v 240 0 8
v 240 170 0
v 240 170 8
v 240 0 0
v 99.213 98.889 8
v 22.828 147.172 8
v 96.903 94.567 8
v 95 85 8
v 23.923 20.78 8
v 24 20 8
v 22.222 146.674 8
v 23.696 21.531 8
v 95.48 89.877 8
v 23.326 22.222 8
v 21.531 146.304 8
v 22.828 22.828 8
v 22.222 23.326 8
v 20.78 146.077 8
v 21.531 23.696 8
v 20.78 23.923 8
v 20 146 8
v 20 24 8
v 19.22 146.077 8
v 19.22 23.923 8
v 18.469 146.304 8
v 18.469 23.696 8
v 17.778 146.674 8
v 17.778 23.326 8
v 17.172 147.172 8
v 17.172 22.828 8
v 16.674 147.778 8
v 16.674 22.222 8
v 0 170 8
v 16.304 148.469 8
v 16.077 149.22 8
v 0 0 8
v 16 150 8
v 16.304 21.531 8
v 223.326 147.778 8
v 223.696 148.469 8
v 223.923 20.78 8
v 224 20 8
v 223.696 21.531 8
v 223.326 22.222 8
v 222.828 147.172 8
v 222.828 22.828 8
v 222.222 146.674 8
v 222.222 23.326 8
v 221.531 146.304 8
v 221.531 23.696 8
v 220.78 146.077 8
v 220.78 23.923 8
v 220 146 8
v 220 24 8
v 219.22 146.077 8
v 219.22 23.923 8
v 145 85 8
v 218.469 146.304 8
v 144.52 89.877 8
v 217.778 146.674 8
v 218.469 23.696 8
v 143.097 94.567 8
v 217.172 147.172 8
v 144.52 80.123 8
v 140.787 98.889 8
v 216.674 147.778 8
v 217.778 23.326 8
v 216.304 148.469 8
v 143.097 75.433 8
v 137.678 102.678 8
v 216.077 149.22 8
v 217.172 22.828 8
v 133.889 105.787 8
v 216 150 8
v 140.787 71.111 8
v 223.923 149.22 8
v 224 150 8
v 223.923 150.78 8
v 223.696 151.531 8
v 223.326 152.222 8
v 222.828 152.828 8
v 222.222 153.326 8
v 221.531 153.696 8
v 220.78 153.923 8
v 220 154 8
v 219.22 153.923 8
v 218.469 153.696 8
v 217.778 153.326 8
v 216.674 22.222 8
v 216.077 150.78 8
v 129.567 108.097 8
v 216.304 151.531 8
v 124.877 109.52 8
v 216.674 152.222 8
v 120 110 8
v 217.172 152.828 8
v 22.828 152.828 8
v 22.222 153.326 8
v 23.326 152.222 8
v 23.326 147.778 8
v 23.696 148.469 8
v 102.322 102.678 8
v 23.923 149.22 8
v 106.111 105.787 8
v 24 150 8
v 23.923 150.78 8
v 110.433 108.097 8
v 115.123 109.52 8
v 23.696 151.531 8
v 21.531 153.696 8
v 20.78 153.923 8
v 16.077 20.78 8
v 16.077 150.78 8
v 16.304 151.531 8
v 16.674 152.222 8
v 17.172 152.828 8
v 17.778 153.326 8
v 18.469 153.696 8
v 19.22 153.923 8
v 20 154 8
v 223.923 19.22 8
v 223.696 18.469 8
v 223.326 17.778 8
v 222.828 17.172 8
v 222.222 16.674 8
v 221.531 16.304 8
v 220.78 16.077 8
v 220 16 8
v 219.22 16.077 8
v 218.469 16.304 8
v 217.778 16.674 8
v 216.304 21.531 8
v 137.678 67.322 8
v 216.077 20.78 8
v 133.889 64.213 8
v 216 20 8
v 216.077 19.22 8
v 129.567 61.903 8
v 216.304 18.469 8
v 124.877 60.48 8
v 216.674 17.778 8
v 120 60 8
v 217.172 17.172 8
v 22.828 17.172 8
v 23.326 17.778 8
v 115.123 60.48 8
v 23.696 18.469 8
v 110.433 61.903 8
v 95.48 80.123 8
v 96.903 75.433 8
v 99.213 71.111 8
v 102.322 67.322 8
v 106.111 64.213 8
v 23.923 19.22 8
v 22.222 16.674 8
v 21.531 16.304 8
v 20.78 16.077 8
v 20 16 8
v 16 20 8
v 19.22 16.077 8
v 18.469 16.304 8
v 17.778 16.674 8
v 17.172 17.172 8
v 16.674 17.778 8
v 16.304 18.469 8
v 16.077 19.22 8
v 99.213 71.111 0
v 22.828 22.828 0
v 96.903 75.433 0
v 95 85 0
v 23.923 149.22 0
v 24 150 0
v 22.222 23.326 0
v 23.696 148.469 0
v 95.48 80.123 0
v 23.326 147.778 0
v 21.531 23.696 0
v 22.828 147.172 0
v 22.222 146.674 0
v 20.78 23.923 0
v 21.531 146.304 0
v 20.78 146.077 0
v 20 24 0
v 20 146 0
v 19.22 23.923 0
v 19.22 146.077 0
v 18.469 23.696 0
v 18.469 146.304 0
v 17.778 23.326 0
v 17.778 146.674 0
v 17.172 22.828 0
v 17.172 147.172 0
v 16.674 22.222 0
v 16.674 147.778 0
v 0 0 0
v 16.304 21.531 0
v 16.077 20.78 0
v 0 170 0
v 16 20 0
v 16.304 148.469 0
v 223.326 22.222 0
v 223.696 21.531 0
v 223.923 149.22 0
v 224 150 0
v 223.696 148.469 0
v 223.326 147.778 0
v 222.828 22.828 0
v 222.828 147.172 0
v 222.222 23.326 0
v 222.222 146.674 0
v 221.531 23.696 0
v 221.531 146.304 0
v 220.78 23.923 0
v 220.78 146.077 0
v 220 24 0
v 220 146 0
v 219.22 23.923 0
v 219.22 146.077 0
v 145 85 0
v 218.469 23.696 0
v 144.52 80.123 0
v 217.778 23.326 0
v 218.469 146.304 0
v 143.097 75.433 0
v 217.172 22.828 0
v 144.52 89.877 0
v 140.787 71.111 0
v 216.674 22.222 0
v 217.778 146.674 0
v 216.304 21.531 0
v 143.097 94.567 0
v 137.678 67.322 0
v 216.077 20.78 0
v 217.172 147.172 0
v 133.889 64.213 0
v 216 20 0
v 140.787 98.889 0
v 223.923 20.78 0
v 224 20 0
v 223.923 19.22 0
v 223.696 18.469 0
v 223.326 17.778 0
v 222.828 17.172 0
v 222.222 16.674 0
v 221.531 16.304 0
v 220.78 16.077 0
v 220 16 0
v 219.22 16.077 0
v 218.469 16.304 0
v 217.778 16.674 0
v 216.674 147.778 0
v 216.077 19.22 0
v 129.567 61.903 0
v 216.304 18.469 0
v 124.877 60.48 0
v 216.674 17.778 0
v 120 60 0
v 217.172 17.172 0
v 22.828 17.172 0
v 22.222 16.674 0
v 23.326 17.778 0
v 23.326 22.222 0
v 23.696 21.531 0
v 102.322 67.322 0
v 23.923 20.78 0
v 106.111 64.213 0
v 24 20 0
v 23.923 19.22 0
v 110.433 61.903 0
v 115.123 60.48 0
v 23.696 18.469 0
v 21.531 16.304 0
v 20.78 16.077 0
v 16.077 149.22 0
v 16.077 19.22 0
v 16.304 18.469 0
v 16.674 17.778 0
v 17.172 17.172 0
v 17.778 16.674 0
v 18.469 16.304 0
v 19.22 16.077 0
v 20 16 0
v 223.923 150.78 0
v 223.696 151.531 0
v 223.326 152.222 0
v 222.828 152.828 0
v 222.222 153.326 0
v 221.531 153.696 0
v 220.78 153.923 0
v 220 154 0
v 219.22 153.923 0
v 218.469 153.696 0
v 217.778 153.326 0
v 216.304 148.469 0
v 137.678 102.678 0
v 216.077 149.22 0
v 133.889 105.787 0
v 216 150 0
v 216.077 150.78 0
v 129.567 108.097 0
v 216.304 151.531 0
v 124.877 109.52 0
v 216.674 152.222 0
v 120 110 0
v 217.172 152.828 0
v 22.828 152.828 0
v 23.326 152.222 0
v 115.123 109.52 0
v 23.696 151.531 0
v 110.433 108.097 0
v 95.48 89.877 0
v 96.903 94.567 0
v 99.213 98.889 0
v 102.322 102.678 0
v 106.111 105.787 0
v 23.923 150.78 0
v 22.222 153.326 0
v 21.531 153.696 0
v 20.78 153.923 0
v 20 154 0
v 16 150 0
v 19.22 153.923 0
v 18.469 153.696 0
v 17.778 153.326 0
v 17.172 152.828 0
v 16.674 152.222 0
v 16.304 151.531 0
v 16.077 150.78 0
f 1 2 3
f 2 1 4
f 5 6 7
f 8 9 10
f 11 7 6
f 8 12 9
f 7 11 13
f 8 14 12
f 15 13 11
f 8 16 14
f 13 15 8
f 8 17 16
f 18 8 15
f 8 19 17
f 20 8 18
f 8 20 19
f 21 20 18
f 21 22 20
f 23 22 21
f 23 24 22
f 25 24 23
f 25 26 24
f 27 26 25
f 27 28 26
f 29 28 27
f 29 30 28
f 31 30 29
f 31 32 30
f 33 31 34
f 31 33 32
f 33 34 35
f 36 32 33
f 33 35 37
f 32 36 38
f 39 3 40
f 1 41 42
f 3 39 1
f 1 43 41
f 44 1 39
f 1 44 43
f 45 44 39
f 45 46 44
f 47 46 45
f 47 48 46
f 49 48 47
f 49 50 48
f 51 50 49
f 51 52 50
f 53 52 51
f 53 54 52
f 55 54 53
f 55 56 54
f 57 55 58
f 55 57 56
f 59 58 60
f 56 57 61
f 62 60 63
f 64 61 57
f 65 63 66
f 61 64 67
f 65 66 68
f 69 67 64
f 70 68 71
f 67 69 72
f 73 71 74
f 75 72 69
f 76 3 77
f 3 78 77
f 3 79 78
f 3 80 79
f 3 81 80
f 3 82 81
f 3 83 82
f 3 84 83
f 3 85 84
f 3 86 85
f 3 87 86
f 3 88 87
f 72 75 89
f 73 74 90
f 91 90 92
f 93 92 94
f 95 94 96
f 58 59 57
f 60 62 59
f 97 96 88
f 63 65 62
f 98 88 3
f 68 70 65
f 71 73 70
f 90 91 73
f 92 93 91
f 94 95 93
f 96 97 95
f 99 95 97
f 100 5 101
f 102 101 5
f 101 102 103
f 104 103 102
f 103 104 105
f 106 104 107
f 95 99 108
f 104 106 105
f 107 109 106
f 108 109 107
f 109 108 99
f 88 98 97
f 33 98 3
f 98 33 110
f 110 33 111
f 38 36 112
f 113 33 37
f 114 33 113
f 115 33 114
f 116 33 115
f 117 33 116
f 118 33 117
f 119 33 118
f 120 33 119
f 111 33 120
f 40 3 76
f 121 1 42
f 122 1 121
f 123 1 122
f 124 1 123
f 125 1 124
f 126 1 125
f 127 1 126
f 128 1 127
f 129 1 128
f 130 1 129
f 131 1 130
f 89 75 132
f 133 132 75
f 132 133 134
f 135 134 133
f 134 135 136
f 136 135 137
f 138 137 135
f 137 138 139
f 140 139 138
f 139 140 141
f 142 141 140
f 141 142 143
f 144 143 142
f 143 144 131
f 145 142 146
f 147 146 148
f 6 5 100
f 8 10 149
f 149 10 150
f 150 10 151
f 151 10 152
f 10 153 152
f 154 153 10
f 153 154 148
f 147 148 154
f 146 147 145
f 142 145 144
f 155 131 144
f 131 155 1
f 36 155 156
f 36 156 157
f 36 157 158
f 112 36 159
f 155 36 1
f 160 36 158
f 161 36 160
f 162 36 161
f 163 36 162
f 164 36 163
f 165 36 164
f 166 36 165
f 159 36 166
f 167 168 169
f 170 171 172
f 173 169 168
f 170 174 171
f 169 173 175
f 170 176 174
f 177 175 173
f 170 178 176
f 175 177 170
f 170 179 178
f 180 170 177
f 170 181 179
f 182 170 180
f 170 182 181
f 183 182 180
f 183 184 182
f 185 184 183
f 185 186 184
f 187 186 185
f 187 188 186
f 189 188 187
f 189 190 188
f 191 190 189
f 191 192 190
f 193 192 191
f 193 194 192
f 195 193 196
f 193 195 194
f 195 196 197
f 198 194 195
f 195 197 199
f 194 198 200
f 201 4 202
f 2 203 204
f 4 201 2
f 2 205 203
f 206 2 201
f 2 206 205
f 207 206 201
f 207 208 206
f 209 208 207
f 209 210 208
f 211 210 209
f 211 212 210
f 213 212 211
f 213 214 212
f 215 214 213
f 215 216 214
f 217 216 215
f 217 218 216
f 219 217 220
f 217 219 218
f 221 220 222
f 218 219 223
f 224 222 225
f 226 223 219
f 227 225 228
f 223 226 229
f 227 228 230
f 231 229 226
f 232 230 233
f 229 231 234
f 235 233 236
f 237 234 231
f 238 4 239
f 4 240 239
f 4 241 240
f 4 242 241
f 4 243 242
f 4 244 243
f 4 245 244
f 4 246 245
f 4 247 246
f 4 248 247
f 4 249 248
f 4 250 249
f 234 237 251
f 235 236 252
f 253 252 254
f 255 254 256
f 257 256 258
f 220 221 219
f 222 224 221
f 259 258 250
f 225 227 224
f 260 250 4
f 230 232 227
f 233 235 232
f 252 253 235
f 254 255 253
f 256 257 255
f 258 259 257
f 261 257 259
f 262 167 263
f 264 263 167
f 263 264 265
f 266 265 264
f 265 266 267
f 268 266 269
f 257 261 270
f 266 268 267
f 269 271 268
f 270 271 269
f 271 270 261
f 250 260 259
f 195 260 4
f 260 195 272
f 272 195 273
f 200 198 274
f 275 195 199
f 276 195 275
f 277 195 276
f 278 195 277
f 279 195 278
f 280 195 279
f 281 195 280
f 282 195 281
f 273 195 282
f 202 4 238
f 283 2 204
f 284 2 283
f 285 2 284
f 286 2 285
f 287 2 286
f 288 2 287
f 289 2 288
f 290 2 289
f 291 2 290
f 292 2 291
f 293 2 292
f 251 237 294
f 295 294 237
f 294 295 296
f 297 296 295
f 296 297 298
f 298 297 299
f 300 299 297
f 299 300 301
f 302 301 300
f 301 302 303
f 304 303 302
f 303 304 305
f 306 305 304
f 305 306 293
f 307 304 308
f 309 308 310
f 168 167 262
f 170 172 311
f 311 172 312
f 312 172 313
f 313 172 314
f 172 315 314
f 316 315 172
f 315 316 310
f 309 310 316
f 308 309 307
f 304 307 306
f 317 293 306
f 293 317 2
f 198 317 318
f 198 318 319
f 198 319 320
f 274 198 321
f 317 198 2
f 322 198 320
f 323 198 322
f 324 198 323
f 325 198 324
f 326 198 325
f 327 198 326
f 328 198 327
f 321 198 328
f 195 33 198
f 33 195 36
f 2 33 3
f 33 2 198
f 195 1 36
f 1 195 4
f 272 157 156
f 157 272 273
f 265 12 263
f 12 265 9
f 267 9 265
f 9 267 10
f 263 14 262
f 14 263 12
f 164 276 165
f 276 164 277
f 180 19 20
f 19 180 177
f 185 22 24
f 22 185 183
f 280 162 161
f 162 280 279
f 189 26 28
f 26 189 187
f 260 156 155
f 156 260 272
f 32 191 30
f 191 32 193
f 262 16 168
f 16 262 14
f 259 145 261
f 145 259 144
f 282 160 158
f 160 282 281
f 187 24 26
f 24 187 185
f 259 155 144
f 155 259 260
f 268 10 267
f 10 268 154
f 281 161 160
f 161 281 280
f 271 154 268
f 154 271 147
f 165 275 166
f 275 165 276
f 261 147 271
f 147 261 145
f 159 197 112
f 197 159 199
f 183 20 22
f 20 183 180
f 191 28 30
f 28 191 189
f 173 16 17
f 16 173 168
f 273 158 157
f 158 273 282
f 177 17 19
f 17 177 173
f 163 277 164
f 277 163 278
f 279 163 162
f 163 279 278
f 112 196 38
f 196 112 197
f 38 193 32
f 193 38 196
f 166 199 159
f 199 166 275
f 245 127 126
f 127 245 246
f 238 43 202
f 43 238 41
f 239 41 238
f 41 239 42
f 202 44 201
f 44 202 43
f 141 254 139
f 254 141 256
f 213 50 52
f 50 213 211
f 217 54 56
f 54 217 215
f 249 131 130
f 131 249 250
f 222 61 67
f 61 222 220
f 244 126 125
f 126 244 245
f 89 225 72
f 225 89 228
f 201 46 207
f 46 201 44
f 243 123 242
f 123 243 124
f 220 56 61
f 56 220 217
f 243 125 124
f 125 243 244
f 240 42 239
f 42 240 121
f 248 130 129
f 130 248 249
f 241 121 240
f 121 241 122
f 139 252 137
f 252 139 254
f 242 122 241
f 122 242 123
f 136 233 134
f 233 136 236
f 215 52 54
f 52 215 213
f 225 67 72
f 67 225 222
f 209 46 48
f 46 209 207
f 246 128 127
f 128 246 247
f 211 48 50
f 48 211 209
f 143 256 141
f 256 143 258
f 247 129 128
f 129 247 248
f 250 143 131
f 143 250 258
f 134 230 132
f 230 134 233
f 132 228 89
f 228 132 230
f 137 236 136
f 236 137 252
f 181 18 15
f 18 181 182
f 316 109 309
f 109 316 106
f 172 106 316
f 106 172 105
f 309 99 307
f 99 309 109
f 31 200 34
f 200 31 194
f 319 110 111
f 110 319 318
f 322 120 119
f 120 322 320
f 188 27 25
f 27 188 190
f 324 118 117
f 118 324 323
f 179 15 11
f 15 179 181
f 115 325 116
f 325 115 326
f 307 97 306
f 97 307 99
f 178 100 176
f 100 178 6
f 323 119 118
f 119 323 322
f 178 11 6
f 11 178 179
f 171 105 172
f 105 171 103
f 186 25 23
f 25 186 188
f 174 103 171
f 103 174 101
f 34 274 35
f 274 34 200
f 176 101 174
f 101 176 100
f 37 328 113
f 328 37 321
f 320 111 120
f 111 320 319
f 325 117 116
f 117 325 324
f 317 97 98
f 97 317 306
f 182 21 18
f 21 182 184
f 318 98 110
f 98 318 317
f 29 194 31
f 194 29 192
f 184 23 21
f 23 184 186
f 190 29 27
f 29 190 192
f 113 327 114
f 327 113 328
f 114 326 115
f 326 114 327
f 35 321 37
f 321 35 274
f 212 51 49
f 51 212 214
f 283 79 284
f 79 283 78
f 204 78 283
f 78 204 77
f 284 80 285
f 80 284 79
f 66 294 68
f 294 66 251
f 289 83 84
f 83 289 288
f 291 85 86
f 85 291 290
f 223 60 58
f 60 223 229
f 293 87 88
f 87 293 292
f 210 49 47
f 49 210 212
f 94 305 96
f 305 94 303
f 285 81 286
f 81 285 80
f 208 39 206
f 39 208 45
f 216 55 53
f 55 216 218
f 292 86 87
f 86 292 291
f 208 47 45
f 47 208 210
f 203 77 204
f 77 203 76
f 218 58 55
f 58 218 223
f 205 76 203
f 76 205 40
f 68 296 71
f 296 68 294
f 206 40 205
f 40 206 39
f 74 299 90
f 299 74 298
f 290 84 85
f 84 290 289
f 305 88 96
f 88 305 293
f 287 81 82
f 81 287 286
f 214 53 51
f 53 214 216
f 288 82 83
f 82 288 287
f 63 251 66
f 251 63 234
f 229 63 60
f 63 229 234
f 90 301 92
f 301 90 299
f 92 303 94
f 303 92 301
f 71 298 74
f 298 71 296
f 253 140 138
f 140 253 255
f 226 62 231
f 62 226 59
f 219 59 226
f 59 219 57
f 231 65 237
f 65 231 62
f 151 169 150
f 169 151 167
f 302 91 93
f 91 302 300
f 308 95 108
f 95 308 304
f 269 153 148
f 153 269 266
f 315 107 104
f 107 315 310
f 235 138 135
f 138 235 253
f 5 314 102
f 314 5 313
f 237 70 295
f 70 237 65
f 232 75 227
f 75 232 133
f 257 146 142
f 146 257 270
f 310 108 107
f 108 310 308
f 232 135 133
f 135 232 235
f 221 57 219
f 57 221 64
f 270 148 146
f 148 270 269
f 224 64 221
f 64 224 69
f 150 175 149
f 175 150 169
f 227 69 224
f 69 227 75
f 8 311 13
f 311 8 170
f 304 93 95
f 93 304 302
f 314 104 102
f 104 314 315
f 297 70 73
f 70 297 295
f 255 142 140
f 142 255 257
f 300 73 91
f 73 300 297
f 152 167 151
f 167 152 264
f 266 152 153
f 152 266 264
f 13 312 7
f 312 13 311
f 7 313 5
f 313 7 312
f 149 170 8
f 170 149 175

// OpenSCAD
$fn = 32;

// ----------------------------------------------------------------------
// Big plate: 200-250 mm adapter plate
// ----------------------------------------------------------------------

// --- parameters (mm) ---
plate_l = 240;            // plate length, X
plate_w = 170;            // plate width, Y
plate_t = 8;              // plate thickness, Z
corner_d = 8;             // corner hole diameter
corner_in = 20;           // corner hole inset from the edges
bore_d = 50;              // central bore

difference() {
  cube([plate_l, plate_w, plate_t]);
  translate([corner_in, corner_in, -1]) cylinder(h = plate_t + 2, d = corner_d);
  translate([plate_l - corner_in, corner_in, -1]) cylinder(h = plate_t + 2, d = corner_d);
  translate([corner_in, plate_w - corner_in, -1]) cylinder(h = plate_t + 2, d = corner_d);
  translate([plate_l - corner_in, plate_w - corner_in, -1]) cylinder(h = plate_t + 2, d = corner_d);
  translate([plate_l / 2, plate_w / 2, -1]) cylinder(h = plate_t + 2, d = bore_d);
}
